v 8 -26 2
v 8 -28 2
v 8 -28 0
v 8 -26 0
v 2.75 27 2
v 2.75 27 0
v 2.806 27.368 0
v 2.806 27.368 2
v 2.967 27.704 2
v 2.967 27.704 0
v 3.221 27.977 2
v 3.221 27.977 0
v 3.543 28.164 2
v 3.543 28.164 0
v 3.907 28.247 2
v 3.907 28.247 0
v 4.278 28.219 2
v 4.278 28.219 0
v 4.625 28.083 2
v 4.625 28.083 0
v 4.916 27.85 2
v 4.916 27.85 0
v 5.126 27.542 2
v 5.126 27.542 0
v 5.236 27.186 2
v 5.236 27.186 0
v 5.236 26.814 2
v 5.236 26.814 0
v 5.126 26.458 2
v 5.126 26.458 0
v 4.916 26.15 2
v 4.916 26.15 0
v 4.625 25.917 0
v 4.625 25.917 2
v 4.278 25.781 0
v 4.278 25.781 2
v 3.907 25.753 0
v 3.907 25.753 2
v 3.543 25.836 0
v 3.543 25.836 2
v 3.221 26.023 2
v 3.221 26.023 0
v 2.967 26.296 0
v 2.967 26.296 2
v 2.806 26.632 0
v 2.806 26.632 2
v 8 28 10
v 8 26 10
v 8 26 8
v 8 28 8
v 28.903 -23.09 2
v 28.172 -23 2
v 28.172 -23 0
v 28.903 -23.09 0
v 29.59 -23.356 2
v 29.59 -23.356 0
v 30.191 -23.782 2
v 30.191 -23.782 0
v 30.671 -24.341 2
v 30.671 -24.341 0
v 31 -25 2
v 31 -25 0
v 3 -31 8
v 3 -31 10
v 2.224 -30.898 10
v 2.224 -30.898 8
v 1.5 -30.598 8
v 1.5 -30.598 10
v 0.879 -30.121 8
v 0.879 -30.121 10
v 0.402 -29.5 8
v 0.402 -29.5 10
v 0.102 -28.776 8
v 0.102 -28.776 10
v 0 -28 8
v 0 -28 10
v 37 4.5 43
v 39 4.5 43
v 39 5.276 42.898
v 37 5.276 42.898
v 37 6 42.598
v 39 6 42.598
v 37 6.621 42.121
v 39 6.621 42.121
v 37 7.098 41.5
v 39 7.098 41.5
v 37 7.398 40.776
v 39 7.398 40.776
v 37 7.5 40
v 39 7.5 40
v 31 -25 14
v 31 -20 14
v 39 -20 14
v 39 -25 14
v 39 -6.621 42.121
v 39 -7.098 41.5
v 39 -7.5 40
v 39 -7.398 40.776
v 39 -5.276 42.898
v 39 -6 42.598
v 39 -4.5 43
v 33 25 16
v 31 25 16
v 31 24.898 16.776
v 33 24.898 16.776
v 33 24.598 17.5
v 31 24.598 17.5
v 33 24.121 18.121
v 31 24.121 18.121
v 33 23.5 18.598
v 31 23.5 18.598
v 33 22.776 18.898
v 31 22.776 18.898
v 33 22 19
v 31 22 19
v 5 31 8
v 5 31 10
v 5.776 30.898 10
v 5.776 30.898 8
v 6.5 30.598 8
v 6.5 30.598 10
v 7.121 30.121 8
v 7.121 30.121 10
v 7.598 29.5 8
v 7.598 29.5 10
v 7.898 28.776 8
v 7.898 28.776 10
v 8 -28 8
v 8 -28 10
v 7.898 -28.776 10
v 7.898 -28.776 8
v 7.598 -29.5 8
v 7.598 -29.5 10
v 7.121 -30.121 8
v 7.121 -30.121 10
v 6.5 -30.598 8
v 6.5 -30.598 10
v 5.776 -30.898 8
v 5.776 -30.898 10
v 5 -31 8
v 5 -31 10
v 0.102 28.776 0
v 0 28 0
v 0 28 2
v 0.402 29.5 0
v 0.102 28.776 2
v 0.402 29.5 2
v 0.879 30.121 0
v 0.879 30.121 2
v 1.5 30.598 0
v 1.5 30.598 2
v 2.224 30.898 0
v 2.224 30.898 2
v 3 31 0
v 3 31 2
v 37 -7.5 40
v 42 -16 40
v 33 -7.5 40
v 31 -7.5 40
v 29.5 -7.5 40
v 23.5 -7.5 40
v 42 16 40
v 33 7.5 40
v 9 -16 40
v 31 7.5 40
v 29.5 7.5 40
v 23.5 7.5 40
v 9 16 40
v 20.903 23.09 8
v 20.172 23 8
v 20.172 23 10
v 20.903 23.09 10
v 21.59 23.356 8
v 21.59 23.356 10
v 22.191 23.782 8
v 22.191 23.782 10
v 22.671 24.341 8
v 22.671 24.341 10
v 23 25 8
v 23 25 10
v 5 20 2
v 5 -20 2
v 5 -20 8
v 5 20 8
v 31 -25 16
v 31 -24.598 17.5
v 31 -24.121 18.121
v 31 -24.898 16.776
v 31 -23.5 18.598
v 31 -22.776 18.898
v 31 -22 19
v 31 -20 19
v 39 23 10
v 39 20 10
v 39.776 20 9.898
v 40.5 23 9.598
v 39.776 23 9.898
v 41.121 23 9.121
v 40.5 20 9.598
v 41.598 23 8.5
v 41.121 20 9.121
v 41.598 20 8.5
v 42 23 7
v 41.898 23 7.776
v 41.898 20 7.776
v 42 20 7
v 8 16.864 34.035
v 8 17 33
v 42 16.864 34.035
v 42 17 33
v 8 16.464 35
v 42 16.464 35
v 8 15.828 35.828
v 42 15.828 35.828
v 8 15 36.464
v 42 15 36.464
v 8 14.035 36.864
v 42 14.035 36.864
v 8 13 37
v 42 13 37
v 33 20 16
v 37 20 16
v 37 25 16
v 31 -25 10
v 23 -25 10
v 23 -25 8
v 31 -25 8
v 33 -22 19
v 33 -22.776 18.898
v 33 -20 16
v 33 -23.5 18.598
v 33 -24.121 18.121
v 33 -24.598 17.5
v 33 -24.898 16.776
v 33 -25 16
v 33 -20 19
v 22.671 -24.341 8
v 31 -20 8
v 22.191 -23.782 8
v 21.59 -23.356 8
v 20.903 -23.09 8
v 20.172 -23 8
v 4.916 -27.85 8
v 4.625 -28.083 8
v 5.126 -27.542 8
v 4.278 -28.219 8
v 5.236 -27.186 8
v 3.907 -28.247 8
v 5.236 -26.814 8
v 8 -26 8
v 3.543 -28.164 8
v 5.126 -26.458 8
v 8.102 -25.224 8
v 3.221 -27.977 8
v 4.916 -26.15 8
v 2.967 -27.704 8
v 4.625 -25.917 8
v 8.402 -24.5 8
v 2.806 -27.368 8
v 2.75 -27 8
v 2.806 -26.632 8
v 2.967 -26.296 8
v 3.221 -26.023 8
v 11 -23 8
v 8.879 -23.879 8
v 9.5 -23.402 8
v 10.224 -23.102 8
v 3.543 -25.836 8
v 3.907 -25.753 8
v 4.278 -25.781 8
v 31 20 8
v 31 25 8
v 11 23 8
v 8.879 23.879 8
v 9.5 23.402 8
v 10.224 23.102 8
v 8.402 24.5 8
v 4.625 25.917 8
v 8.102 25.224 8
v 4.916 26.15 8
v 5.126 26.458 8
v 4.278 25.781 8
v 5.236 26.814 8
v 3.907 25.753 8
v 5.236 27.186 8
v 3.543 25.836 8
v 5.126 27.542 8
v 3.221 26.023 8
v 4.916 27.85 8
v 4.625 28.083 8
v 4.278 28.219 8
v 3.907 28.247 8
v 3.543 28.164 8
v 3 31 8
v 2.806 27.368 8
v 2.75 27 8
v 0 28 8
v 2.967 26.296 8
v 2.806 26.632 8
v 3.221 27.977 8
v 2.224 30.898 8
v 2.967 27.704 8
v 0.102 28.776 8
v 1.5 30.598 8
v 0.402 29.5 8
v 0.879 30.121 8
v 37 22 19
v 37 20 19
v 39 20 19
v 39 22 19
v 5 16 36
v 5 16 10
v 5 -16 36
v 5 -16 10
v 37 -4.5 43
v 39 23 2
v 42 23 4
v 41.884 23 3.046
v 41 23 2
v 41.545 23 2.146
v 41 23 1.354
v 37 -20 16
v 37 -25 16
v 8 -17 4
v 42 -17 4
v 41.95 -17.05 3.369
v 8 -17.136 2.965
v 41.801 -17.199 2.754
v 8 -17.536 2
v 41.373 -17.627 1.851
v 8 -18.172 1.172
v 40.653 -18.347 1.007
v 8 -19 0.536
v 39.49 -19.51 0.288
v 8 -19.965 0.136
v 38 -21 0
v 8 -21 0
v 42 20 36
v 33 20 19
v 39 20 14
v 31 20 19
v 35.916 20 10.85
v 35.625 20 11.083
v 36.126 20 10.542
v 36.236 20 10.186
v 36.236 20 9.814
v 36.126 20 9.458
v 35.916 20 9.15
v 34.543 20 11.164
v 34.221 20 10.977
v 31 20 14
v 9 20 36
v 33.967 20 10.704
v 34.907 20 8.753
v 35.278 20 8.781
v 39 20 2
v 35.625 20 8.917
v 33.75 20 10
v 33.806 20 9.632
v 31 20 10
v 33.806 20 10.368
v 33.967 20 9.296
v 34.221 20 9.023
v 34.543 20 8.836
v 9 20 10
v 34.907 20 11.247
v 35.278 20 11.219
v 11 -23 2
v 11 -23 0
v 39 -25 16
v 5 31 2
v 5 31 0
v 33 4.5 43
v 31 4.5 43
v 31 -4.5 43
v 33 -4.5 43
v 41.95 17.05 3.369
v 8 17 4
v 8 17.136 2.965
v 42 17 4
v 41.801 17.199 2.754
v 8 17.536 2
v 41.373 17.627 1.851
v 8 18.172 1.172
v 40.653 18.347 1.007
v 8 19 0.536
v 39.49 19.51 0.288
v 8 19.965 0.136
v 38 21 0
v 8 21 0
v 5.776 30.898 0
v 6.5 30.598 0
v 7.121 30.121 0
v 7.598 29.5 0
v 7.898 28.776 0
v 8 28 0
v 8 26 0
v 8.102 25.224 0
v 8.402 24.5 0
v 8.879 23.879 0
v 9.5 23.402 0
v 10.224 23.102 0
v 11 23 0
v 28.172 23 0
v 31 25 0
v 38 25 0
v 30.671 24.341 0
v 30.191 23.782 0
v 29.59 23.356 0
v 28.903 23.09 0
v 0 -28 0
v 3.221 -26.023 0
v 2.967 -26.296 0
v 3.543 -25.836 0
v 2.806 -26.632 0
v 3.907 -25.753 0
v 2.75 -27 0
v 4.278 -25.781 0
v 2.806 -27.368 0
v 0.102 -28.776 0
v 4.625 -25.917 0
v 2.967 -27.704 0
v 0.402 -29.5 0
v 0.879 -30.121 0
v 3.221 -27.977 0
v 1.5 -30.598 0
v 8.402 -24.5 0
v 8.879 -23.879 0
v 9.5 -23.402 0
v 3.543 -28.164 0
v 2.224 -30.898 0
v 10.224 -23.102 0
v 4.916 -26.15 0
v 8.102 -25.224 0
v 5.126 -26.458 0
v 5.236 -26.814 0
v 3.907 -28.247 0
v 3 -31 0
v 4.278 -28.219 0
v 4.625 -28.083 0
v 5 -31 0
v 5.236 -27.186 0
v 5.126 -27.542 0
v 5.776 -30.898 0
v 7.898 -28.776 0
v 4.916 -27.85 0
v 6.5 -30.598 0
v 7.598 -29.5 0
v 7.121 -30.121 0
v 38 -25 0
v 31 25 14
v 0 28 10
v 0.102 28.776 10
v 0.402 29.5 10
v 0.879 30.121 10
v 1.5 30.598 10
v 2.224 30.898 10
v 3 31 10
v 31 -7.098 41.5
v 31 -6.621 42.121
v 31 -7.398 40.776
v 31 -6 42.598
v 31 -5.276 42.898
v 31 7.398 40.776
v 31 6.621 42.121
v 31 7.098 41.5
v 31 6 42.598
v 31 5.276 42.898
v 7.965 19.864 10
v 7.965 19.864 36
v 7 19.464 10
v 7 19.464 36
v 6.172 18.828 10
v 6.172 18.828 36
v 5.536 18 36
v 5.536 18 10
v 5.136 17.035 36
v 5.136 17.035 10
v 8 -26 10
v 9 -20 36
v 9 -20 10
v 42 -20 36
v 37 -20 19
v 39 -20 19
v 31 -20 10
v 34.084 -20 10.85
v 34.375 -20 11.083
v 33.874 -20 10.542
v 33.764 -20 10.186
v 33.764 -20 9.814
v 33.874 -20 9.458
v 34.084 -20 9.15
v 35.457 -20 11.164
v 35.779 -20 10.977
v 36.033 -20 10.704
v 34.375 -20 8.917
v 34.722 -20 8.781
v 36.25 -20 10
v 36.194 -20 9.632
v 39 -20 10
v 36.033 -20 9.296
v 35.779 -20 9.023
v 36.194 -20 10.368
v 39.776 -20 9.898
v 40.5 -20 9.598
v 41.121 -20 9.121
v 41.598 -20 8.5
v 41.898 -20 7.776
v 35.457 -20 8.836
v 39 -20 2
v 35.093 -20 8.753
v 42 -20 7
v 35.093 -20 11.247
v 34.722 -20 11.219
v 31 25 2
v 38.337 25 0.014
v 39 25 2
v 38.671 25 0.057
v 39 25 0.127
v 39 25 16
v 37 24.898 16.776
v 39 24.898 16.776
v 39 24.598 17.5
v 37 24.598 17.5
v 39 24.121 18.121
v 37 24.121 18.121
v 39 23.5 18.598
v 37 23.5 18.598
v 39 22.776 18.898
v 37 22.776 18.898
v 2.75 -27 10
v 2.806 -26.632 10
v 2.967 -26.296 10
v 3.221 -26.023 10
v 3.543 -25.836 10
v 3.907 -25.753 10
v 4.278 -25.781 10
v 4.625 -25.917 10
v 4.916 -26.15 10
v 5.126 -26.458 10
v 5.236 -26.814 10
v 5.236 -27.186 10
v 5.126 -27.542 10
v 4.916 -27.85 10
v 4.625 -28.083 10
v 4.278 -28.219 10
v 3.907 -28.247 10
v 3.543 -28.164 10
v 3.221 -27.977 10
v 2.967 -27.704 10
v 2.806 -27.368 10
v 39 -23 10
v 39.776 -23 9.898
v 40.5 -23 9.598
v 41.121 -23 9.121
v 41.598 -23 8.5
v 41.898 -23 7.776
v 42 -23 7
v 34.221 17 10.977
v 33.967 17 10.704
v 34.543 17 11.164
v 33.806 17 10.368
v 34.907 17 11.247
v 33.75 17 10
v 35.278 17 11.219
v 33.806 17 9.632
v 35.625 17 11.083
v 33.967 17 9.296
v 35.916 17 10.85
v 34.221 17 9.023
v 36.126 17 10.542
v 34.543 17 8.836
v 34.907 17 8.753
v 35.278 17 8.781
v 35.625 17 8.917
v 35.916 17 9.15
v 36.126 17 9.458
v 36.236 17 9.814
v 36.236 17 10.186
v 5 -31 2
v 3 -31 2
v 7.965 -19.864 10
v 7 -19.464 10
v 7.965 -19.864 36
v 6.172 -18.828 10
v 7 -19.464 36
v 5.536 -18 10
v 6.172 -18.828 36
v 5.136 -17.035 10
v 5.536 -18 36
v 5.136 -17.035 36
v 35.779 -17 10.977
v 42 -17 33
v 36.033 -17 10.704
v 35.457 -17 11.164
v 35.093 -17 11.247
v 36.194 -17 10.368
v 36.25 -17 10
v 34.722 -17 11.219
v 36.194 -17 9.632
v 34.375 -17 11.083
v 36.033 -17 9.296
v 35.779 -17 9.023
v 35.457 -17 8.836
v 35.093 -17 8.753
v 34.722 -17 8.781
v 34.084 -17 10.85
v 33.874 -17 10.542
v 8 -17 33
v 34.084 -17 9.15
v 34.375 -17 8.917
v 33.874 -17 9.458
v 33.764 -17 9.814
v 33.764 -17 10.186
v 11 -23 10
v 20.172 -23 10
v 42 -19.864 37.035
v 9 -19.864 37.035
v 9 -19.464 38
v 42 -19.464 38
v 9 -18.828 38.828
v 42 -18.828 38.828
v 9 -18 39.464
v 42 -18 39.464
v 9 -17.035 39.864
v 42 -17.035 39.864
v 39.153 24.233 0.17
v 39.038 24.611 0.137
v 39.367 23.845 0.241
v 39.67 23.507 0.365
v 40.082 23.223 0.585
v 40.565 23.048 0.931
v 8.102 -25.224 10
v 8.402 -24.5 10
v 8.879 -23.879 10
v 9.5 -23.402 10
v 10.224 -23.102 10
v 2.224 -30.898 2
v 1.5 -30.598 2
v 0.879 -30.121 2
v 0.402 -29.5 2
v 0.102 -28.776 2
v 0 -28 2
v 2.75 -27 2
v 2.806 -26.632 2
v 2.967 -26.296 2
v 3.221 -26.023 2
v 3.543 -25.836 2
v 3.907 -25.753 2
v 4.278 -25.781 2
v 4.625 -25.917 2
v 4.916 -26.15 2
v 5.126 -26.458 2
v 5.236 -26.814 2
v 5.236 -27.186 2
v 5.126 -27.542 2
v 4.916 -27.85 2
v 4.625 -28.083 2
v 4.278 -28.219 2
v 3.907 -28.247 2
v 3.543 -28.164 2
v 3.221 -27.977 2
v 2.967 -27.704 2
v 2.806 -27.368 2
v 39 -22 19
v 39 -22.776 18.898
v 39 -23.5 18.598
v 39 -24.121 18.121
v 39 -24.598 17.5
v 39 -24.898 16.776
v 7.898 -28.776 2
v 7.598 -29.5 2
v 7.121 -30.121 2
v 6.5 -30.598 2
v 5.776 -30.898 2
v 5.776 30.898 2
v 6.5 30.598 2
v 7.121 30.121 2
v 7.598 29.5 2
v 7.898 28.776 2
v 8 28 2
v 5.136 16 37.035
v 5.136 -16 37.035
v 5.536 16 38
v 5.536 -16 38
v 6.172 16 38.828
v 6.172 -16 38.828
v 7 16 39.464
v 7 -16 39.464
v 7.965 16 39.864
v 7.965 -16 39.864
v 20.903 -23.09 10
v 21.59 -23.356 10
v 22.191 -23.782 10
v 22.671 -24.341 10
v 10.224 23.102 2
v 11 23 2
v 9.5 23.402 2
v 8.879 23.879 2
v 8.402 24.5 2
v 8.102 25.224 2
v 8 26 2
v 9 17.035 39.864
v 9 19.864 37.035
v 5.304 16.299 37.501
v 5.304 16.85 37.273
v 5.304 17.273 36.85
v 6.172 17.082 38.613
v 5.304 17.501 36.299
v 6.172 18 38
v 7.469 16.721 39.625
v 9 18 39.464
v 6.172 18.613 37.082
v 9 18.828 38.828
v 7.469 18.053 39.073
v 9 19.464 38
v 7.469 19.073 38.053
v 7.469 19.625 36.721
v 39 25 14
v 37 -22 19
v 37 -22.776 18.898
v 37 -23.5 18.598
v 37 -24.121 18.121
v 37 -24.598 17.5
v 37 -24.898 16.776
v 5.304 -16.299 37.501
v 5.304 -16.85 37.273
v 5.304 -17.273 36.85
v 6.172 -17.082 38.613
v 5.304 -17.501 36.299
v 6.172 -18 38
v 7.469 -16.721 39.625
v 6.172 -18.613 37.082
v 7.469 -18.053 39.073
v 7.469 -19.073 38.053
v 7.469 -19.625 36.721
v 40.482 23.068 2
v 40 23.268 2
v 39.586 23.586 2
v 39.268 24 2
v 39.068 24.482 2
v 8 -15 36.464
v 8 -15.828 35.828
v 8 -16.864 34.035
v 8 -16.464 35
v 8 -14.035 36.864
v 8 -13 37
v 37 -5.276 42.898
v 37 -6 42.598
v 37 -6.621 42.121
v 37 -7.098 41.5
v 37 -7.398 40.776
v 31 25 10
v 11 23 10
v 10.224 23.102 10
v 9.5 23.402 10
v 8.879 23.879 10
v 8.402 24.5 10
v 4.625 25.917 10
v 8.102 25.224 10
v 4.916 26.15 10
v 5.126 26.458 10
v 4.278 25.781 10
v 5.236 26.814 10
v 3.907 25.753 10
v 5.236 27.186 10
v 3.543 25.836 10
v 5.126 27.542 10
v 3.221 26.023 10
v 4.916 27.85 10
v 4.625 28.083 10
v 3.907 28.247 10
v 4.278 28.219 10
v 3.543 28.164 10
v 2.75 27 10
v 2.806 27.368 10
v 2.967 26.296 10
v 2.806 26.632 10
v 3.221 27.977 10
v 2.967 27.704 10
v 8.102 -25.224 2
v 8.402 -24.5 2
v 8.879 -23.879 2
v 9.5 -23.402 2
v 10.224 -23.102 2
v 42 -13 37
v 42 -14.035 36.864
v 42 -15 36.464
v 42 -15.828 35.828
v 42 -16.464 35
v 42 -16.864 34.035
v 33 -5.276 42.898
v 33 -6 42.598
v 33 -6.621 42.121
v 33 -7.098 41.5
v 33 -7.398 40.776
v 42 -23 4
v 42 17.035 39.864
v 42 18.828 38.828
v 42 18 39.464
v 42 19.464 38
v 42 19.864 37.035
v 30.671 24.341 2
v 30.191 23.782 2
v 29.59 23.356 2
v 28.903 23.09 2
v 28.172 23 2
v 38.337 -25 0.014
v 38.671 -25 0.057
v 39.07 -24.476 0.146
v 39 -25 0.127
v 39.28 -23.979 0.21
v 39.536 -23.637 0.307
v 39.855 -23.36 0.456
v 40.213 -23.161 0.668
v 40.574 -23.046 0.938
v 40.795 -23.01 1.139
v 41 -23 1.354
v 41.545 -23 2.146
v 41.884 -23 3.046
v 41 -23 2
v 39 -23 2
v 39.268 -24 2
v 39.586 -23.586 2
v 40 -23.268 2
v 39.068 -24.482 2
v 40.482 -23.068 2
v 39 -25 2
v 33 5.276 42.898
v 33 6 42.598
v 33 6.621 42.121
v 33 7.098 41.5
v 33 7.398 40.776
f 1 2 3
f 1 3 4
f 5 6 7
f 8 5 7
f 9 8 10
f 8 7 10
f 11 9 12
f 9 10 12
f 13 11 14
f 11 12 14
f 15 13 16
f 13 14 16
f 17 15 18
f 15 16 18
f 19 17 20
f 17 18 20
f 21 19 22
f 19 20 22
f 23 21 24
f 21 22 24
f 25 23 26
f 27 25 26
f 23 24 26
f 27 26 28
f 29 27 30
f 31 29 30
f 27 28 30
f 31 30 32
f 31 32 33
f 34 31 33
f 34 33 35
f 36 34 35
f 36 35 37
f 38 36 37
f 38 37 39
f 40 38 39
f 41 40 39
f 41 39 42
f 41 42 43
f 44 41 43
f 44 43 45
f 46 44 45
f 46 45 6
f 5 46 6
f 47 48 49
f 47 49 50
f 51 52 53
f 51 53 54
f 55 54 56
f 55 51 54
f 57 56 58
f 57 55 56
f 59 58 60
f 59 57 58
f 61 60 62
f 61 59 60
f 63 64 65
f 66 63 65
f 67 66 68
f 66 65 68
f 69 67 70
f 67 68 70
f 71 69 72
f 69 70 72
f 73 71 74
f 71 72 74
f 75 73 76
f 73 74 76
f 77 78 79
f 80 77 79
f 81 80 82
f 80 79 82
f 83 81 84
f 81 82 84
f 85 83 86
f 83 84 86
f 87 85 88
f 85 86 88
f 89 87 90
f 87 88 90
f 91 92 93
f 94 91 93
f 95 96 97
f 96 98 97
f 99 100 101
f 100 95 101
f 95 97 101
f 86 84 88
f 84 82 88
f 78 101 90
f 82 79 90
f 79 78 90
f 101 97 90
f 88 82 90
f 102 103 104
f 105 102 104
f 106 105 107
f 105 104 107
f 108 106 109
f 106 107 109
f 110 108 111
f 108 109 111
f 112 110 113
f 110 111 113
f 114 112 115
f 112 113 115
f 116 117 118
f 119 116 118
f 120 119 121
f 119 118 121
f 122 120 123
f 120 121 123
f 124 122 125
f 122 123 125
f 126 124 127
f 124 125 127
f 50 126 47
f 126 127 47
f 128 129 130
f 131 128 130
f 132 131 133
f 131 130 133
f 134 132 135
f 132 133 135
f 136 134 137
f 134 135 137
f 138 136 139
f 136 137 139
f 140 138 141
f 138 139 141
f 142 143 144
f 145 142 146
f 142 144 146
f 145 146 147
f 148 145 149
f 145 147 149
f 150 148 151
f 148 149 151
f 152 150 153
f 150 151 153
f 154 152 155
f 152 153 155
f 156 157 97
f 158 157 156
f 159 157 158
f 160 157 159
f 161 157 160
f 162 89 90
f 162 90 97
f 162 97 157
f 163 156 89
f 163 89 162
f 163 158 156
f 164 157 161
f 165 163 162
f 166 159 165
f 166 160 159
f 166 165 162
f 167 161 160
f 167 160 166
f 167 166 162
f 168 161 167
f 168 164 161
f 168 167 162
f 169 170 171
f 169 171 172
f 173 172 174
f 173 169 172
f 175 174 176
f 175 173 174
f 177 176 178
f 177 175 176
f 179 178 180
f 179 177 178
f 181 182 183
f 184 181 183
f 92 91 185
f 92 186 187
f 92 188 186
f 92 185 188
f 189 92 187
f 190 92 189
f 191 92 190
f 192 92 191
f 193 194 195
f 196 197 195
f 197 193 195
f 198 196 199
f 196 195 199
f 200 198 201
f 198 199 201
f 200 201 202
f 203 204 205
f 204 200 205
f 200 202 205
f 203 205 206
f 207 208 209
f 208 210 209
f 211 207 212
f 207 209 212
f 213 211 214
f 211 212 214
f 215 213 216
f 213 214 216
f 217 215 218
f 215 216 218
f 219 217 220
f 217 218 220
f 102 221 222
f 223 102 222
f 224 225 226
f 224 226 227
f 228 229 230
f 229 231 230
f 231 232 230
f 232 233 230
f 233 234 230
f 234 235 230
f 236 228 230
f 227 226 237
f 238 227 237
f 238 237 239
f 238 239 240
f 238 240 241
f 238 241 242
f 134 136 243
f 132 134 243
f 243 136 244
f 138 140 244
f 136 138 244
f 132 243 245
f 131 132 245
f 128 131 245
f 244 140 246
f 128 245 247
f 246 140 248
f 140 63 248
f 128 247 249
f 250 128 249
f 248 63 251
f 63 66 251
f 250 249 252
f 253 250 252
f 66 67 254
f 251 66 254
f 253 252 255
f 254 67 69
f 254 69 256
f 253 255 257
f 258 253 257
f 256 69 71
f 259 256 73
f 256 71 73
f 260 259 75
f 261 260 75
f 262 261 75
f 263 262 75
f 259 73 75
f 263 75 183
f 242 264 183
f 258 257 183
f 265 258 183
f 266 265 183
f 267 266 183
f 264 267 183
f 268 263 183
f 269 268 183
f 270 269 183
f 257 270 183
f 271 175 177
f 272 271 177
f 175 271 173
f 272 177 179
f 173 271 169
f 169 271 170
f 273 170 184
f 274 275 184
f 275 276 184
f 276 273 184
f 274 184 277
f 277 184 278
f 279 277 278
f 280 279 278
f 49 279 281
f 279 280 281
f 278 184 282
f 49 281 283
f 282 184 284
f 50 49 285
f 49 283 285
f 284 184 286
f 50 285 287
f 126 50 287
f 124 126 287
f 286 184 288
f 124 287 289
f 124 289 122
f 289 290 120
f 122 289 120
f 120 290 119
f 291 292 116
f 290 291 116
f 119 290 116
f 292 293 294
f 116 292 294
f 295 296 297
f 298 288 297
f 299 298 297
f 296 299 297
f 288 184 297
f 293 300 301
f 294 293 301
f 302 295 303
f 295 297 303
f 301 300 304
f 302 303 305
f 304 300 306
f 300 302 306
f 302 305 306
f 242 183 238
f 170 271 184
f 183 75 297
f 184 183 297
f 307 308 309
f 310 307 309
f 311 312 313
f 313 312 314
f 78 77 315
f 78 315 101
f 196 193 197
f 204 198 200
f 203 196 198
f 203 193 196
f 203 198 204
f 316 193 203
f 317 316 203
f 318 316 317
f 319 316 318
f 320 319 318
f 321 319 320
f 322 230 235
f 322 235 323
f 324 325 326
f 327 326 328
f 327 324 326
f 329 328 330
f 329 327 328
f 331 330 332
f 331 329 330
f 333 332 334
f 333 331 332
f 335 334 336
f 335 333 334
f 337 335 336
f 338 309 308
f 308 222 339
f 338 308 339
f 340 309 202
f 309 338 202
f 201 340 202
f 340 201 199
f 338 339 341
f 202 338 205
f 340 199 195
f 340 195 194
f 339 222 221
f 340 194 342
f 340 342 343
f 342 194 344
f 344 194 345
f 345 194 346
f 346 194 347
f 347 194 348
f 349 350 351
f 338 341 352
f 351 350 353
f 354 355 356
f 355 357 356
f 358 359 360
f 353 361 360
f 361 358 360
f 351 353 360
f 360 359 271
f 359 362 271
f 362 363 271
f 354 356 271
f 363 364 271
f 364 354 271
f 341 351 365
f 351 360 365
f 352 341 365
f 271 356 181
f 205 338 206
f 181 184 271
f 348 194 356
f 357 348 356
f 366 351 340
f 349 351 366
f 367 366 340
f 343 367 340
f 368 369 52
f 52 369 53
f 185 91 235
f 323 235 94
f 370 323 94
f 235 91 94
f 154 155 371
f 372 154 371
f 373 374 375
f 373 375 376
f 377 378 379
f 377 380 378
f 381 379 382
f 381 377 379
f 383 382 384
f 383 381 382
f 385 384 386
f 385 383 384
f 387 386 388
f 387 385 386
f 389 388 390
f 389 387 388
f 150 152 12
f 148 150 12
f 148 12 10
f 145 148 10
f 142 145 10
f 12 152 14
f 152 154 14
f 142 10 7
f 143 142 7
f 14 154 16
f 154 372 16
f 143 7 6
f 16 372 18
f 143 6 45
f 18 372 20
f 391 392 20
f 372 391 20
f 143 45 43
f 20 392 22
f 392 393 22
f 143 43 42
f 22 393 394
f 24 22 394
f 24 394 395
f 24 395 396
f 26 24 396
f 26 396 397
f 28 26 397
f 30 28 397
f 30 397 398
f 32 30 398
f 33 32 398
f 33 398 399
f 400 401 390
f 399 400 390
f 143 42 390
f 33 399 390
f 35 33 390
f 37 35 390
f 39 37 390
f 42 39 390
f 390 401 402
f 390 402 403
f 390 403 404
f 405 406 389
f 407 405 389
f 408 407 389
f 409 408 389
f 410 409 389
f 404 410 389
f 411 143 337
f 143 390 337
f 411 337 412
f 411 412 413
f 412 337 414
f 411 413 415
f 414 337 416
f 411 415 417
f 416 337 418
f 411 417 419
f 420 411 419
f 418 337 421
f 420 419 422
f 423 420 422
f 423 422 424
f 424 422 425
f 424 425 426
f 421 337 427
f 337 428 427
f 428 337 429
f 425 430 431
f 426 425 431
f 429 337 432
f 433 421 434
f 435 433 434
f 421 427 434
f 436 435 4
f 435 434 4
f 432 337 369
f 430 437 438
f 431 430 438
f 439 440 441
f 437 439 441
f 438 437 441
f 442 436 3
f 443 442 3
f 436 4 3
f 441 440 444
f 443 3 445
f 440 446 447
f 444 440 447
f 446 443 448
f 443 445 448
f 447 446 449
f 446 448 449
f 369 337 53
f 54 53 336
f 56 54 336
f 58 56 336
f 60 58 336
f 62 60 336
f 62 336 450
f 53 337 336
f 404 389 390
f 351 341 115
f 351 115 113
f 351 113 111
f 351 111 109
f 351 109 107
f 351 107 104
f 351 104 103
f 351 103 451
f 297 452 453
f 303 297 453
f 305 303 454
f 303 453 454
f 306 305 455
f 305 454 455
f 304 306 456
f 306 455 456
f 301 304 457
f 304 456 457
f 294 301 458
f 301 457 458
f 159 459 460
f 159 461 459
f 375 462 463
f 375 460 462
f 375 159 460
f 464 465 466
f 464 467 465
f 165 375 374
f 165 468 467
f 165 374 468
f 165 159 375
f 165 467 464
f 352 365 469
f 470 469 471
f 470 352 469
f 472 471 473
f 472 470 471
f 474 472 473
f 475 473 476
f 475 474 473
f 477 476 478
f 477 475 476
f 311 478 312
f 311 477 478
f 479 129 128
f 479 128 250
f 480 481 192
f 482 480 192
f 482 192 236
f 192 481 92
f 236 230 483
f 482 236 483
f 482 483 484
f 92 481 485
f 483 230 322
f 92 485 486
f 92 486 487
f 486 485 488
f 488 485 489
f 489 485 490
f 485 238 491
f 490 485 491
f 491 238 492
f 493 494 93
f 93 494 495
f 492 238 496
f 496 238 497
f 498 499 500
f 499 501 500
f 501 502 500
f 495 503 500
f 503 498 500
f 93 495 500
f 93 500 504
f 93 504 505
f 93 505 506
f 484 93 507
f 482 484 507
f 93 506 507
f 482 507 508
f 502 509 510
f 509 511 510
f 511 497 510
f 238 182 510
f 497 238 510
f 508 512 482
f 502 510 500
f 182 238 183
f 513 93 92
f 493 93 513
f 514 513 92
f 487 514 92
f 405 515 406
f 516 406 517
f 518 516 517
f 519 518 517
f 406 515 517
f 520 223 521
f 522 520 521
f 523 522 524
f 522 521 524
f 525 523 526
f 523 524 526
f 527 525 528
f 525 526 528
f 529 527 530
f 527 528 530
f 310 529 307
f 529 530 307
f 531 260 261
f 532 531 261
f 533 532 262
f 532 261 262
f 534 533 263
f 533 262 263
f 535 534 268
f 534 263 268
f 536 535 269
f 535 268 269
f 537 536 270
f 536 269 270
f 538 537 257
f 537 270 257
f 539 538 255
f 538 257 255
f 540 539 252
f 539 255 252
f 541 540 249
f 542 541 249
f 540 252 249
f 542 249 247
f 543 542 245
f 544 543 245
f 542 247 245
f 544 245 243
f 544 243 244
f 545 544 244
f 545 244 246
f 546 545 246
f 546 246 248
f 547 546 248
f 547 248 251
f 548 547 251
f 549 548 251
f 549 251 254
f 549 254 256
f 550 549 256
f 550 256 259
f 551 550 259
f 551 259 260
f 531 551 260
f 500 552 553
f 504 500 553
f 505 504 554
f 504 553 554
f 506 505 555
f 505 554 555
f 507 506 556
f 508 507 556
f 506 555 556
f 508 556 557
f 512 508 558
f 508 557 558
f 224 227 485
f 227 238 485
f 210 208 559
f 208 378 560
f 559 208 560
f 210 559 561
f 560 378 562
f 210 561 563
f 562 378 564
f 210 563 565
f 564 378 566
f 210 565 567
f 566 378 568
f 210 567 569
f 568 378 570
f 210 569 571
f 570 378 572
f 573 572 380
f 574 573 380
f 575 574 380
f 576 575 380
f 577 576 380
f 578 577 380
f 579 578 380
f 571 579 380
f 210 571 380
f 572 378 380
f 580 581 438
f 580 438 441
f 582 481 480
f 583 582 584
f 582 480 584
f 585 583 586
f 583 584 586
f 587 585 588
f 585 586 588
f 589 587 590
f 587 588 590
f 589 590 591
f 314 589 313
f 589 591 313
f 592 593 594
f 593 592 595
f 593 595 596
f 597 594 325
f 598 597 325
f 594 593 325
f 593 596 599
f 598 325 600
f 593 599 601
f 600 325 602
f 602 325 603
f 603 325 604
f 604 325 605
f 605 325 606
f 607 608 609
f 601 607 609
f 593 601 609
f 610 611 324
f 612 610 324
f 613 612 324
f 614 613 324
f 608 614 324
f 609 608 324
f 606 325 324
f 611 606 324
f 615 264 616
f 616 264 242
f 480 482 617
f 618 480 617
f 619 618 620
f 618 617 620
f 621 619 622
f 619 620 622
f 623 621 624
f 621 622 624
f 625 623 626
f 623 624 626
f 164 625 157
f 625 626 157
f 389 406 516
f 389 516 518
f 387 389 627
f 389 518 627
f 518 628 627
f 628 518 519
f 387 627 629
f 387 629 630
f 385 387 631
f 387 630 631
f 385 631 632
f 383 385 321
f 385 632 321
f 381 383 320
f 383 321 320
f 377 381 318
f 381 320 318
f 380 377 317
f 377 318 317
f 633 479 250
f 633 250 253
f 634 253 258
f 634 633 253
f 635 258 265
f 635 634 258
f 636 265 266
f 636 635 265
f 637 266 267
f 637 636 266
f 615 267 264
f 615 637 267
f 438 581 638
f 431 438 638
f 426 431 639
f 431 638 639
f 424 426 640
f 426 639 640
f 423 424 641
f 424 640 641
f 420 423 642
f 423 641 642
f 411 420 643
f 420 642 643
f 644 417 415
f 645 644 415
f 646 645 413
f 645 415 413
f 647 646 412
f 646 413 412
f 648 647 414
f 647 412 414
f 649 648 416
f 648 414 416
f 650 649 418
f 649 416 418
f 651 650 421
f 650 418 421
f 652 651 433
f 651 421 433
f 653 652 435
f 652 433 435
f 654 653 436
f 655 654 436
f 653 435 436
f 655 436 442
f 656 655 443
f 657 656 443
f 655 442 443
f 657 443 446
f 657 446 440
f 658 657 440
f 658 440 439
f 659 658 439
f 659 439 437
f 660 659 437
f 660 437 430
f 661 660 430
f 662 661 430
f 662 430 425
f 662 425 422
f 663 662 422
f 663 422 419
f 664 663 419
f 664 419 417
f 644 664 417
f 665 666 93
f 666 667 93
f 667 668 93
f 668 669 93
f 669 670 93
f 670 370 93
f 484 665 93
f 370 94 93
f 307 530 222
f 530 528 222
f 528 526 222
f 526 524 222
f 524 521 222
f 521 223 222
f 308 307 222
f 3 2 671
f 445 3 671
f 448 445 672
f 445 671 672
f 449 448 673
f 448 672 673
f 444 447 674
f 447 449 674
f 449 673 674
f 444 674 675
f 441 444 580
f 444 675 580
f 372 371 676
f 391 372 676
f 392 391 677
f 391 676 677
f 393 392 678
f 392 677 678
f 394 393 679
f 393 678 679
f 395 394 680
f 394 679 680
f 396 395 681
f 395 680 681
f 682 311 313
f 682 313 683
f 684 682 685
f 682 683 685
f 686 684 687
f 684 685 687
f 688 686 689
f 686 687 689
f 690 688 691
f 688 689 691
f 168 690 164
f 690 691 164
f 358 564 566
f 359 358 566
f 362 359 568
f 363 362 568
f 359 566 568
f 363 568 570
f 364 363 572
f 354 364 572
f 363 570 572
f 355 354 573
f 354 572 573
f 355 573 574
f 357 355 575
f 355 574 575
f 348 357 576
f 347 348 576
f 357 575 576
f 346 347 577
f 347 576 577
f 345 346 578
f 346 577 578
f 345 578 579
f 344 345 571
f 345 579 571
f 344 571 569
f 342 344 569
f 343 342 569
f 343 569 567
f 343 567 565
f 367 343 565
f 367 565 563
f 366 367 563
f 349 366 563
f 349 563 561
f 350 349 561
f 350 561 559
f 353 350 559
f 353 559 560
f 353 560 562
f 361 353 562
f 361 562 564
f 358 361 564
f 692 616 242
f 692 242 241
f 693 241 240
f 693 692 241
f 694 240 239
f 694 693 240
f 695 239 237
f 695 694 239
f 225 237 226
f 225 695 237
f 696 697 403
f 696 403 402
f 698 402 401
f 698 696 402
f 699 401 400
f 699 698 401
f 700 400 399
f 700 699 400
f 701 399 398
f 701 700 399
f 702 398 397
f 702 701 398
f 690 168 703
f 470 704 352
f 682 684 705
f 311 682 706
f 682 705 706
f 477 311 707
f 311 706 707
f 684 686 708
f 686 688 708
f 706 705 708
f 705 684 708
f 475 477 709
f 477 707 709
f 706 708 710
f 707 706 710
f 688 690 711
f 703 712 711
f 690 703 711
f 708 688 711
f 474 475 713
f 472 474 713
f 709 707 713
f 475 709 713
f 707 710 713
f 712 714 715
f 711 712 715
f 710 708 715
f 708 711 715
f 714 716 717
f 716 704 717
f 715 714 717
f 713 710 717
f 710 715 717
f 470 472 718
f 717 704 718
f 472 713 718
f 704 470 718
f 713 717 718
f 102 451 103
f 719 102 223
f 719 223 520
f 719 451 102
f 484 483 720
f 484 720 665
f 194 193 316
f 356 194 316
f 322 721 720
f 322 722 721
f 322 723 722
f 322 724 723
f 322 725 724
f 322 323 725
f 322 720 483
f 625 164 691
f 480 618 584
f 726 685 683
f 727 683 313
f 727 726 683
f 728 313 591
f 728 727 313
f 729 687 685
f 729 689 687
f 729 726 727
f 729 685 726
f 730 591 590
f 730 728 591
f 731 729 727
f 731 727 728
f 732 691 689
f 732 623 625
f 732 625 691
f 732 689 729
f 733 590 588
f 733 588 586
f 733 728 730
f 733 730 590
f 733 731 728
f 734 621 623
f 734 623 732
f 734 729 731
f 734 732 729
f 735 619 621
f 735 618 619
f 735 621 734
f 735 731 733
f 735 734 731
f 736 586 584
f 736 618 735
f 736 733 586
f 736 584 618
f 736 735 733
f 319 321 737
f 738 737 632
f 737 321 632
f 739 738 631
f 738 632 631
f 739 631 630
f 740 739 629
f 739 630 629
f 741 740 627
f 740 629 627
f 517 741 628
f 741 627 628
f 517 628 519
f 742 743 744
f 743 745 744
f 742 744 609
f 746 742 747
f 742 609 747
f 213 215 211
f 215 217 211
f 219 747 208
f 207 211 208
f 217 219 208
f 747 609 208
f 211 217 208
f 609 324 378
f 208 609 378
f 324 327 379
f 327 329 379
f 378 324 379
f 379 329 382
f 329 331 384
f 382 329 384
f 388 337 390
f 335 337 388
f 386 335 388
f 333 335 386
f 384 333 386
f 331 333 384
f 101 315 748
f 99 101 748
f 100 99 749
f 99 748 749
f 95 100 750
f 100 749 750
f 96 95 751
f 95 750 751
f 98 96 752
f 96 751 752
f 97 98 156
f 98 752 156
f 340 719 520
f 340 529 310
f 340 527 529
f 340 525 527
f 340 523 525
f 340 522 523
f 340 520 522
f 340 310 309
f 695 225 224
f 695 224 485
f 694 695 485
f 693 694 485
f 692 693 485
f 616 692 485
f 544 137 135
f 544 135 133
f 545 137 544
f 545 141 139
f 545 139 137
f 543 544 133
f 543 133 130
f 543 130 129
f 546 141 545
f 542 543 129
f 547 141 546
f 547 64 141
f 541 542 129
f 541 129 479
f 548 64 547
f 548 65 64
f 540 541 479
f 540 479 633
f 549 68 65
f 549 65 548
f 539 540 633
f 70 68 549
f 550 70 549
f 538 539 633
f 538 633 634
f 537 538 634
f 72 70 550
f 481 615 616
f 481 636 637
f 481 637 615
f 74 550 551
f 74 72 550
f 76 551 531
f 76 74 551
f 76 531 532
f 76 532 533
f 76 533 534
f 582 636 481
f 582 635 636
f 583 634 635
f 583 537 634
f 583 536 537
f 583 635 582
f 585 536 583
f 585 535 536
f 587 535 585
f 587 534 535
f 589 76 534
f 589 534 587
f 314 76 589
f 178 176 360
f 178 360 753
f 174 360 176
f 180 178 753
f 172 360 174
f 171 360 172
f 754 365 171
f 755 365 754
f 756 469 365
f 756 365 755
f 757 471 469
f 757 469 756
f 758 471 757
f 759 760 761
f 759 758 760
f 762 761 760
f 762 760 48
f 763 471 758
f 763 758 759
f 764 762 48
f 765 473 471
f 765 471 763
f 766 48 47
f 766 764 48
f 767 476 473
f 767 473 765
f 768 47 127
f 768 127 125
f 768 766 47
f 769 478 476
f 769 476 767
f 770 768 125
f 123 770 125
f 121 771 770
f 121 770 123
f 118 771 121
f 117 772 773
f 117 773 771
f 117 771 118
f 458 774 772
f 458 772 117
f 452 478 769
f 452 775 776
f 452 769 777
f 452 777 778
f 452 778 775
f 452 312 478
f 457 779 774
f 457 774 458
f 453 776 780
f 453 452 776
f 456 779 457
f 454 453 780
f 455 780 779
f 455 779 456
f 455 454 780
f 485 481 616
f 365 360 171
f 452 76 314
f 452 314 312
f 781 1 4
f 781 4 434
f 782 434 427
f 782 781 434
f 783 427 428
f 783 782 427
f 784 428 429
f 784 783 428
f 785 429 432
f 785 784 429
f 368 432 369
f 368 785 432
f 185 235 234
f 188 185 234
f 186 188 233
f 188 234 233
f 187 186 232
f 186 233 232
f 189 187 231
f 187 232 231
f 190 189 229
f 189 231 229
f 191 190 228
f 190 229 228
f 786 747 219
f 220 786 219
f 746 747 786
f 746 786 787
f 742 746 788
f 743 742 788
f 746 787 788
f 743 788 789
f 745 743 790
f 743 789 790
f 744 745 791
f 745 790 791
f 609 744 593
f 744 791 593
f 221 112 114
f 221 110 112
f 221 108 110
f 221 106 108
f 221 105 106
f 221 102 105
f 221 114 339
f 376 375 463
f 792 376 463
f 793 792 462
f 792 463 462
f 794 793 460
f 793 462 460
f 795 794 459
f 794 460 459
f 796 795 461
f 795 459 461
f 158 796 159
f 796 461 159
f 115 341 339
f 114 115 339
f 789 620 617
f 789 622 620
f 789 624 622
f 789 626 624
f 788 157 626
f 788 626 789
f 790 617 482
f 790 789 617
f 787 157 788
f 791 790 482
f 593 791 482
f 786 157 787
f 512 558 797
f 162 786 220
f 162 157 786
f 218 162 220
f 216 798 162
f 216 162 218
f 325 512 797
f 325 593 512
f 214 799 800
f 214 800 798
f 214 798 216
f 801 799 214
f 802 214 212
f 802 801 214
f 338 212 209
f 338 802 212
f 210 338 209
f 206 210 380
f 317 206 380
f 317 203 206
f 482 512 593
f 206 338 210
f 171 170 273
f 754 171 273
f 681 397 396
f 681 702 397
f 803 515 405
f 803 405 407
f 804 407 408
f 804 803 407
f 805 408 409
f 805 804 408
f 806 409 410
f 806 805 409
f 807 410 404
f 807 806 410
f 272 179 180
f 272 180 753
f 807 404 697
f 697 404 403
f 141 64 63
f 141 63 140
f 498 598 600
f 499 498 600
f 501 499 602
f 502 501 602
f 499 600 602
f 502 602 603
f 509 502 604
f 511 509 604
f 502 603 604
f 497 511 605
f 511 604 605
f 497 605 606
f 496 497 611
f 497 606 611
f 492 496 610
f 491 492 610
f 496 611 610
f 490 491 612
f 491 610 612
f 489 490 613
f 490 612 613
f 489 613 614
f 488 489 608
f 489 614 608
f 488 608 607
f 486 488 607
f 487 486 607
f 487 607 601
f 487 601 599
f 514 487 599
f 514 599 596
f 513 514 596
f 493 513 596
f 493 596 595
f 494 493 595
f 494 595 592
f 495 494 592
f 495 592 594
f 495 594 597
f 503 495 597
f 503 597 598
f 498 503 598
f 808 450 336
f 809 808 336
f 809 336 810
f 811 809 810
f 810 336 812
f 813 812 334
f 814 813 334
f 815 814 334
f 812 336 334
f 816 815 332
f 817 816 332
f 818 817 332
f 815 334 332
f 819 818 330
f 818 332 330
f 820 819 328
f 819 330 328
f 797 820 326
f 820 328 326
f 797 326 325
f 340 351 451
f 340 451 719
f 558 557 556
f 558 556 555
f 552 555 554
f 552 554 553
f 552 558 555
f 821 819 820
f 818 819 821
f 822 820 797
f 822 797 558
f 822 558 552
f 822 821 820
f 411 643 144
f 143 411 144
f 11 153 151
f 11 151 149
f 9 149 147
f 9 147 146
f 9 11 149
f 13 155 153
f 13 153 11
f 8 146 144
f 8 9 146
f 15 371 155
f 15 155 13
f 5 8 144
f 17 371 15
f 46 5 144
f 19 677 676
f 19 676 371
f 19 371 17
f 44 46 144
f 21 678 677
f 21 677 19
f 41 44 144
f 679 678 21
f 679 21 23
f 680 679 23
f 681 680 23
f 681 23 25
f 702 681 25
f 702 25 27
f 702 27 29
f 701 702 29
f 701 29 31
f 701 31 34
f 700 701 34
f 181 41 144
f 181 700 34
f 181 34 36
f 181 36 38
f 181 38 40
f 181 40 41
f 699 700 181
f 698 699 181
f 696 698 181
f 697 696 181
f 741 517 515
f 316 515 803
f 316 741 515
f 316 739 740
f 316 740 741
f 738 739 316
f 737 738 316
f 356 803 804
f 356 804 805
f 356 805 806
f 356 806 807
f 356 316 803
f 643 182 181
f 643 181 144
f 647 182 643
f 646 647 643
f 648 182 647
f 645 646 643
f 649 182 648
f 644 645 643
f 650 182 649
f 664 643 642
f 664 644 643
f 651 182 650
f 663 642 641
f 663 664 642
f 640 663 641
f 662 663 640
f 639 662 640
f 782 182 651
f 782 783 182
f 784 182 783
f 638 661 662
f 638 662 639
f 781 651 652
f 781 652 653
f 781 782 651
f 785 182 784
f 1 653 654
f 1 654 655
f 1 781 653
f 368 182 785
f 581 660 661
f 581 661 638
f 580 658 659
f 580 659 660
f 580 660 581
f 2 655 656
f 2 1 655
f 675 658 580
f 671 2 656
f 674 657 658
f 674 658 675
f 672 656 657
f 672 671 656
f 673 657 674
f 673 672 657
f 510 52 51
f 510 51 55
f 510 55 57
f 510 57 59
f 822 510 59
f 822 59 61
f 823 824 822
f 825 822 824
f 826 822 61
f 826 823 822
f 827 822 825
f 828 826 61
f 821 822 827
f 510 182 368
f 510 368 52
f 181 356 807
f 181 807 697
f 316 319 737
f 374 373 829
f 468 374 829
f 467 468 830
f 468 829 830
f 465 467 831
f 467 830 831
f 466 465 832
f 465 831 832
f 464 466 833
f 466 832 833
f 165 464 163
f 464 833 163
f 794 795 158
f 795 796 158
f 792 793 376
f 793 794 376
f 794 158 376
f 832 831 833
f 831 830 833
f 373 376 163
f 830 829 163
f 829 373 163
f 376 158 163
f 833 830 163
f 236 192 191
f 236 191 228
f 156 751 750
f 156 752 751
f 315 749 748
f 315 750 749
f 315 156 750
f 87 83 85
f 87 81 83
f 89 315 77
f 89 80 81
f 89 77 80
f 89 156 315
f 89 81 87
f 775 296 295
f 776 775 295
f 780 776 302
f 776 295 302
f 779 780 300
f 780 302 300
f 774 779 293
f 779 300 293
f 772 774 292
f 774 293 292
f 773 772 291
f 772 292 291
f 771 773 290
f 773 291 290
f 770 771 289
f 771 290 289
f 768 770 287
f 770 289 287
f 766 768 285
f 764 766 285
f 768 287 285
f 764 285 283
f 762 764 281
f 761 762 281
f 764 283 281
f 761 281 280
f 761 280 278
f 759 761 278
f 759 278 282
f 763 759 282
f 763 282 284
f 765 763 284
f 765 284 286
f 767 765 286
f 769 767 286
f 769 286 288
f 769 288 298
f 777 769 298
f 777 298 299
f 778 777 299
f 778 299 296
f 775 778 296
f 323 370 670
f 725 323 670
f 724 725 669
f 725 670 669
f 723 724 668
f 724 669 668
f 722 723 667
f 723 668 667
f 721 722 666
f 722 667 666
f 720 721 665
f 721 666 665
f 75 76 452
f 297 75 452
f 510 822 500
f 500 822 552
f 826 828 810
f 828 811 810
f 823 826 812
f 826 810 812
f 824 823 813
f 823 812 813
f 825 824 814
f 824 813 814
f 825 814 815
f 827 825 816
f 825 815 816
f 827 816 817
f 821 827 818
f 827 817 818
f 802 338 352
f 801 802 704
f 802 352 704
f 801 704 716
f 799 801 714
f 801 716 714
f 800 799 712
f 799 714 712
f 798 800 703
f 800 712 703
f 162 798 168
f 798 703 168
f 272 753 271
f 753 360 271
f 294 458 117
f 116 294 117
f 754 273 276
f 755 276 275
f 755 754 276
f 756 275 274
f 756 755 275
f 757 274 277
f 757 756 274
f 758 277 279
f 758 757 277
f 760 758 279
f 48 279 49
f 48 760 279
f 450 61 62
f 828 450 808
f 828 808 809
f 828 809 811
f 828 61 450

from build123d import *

# Parameters (mm, degrees)
ESTRUSIONE_ESTRUSIONE1_DEPTH  = 10
SCHIZZO6_W                    = 8
SCHIZZO6_H                    = 8
SCHIZZO6_H_2                  = 2
ESTRUSIONE_ESTRUSIONE4_DEPTH  = 10
TAGLIO_ESTRUSIONE1_DEPTH      = 54.150729064
SCHIZZO4_W                    = 3
SCHIZZO4_H                    = 6
ESTRUSIONE_ESTRUSIONE2_DEPTH  = 3
SCHIZZO5_W                    = 3
SCHIZZO5_H                    = 6
ESTRUSIONE_ESTRUSIONE3_DEPTH  = 3
SCHIZZO3_W                    = 5
SCHIZZO3_H                    = 6
TAGLIO_ESTRUSIONE2_DEPTH      = 67.820655489
FORO_FILETTATO_M3X0_5_1_D     = 2.5
ESTRUSIONE_ESTRUSIONE5_DEPTH  = 30
SCHIZZO10_W                   = 3
SCHIZZO10_H                   = 34
ESTRUSIONE_ESTRUSIONE6_DEPTH  = 34
SCHIZZO18_W                   = 8
SCHIZZO18_H                   = 8
TAGLIO_ESTRUSIONE3_DEPTH      = 5
SCHIZZO24_W                   = 8
SCHIZZO24_H                   = 2
ESTRUSIONE_ESTRUSIONE9_DEPTH  = 5
SCHIZZO23_W                   = 8
SCHIZZO23_H                   = 8
TAGLIO_ESTRUSIONE4_DEPTH      = 5
SCHIZZO25_W                   = 8
SCHIZZO25_H                   = 2
ESTRUSIONE_ESTRUSIONE10_DEPTH = 5
FORO_FILETTATO_M3X0_5_4_D     = 2.5
FORO_FILETTATO_M3X0_5_4_DEPTH = 7.5
FORO_FILETTATO_M3X0_5_4_TIP   = 0.751075774
FORO_FILETTATO_M3X0_5_5_D     = 2.5
FORO_FILETTATO_M3X0_5_5_DEPTH = 7.5
FORO_FILETTATO_M3X0_5_5_TIP   = 0.751075774
SCHIZZO11_W                   = 2
SCHIZZO11_H                   = 15
ESTRUSIONE_ESTRUSIONE7_DEPTH  = 3
SCHIZZO12_W                   = 2
SCHIZZO12_H                   = 5
ESTRUSIONE_ESTRUSIONE8_DEPTH  = 3
SCHIZZO28_W                   = 8
SCHIZZO28_H                   = 2
ESTRUSIONE_ESTRUSIONE11_DEPTH = 2
SCHIZZO29_W                   = 8
SCHIZZO29_H                   = 2
ESTRUSIONE_ESTRUSIONE12_DEPTH = 2
RACCORDO1_R                   = 4
RACCORDO2_R                   = 3
RACCORDO30_R                  = 2


# Some blends are built 0.0001 mm under size
with BuildPart() as part:
    # Schizzo1 → Estrusione-Estrusione1 (new body)
    with BuildSketch(Plane.XY):
        Polygon((0, -23), (42, -23), (42, -17), (8, -17), (8, 17), (42, 17), (42, 23), (0, 23), align=None)
    extrude(amount=ESTRUSIONE_ESTRUSIONE1_DEPTH)

    # Schizzo6 → Estrusione-Estrusione4 (add)
    with BuildSketch(Plane.XY.offset(10)):
        with Locations((4, -27)):
            Rectangle(SCHIZZO6_W, SCHIZZO6_H)
        with Locations((4, 27)):
            Rectangle(SCHIZZO6_W, SCHIZZO6_H)
        with Locations((35, -24)):
            Rectangle(SCHIZZO6_W, SCHIZZO6_H_2)
        with Locations((35, 24)):
            Rectangle(SCHIZZO6_W, SCHIZZO6_H_2)
    extrude(amount=-ESTRUSIONE_ESTRUSIONE4_DEPTH)

    # Schizzo2 → Taglio-Estrusione1 (cut, through all)
    with BuildSketch(Plane(origin=(42, 0, 0), x_dir=(0, 0, -1), z_dir=(1, 0, 0))):
        Polygon((-8, -23), (-8, -41.817102562), (-2, -41.817102562), (-2, -22.5), (-2, -20), (-8, -20), align=None)
    taglio_estrusione1 = extrude(amount=-TAGLIO_ESTRUSIONE1_DEPTH, mode=Mode.SUBTRACT)

    # Schizzo4 → Estrusione-Estrusione2 (add)
    with BuildSketch(Plane(origin=(0, -20, 0), x_dir=(-1, 0, 0), z_dir=(0, -1, 0))):
        with Locations((-40.5, -5)):
            Rectangle(SCHIZZO4_W, SCHIZZO4_H)
    extrude(amount=ESTRUSIONE_ESTRUSIONE2_DEPTH)

    # Specchia1: Taglio-Estrusione1 across plane
    add(taglio_estrusione1.mirror(Plane.ZX), mode=Mode.SUBTRACT)

    # Schizzo5 → Estrusione-Estrusione3 (add)
    with BuildSketch(Plane(origin=(0, 20, 0), x_dir=(1, 0, 0), z_dir=(0, 1, 0))):
        with Locations((40.5, -5)):
            Rectangle(SCHIZZO5_W, SCHIZZO5_H)
    extrude(amount=ESTRUSIONE_ESTRUSIONE3_DEPTH)

    # Schizzo3 → Taglio-Estrusione2 (cut, through all)
    with BuildSketch(Plane.XZ.offset(20)):
        with Locations((2.5, 5)):
            Rectangle(SCHIZZO3_W, SCHIZZO3_H)
    extrude(amount=-TAGLIO_ESTRUSIONE2_DEPTH, mode=Mode.SUBTRACT)

    # Foro filettato M3x0.5-1 (through all)
    with Locations(Plane.XY.offset(10)):
        with Locations((4, -27), (4, 27)):
            Hole(FORO_FILETTATO_M3X0_5_1_D / 2)

    # Schizzo9 → Estrusione-Estrusione5 (add)
    with BuildSketch(Plane.XY.offset(10)):
        Polygon((5, -20), (42, -20), (42, -17), (8, -17), (8, 17), (42, 17), (42, 20), (5, 20), align=None)
    extrude(amount=ESTRUSIONE_ESTRUSIONE5_DEPTH)

    # Schizzo10 → Estrusione-Estrusione6 (add)
    with BuildSketch(Plane(origin=(8, 0, 0), x_dir=(0, 0, -1), z_dir=(1, 0, 0))):
        with Locations((-38.5, 0)):
            Rectangle(SCHIZZO10_W, SCHIZZO10_H)
    extrude(amount=ESTRUSIONE_ESTRUSIONE6_DEPTH)

    # Schizzo18 → Taglio-Estrusione3 (cut)
    with BuildSketch(Plane.XZ.offset(25)):
        with Locations((35, 12)):
            Rectangle(SCHIZZO18_W, SCHIZZO18_H)
    extrude(amount=-TAGLIO_ESTRUSIONE3_DEPTH, mode=Mode.SUBTRACT)

    # Schizzo24 → Estrusione-Estrusione9 (add)
    with BuildSketch(Plane.XZ.offset(20)):
        with Locations((35, 15)):
            Rectangle(SCHIZZO24_W, SCHIZZO24_H)
    extrude(amount=ESTRUSIONE_ESTRUSIONE9_DEPTH)

    # Schizzo23 → Taglio-Estrusione4 (cut)
    with BuildSketch(Plane(origin=(0, 25, 0), x_dir=(1, 0, 0), z_dir=(0, 1, 0))):
        with Locations((35, -12)):
            Rectangle(SCHIZZO23_W, SCHIZZO23_H)
    extrude(amount=-TAGLIO_ESTRUSIONE4_DEPTH, mode=Mode.SUBTRACT)

    # Schizzo25 → Estrusione-Estrusione10 (add)
    with BuildSketch(Plane(origin=(0, 20, 0), x_dir=(1, 0, 0), z_dir=(0, 1, 0))):
        with Locations((35, -15)):
            Rectangle(SCHIZZO25_W, SCHIZZO25_H)
    extrude(amount=ESTRUSIONE_ESTRUSIONE10_DEPTH)

    # Foro filettato M3x0.5-4
    with Locations(Plane(origin=(0, -20, 0), x_dir=(-1, 0, 0), z_dir=(0, -1, 0))):
        with Locations((-35, -10)):
            Hole(FORO_FILETTATO_M3X0_5_4_D / 2, depth=FORO_FILETTATO_M3X0_5_4_DEPTH)
            with Locations((0, 0, -(FORO_FILETTATO_M3X0_5_4_DEPTH + FORO_FILETTATO_M3X0_5_4_TIP / 2))):  # 118° drill point
                Cone(0, FORO_FILETTATO_M3X0_5_4_D / 2, FORO_FILETTATO_M3X0_5_4_TIP, mode=Mode.SUBTRACT)

    # Foro filettato M3x0.5-5
    with Locations(Plane(origin=(0, 20, 0), x_dir=(1, 0, 0), z_dir=(0, 1, 0))):
        with Locations((35, -10)):
            Hole(FORO_FILETTATO_M3X0_5_5_D / 2, depth=FORO_FILETTATO_M3X0_5_5_DEPTH)
            with Locations((0, 0, -(FORO_FILETTATO_M3X0_5_5_DEPTH + FORO_FILETTATO_M3X0_5_5_TIP / 2))):  # 118° drill point
                Cone(0, FORO_FILETTATO_M3X0_5_5_D / 2, FORO_FILETTATO_M3X0_5_5_TIP, mode=Mode.SUBTRACT)

    # Schizzo11 → Estrusione-Estrusione7 (add)
    with BuildSketch(Plane.XY.offset(40)):
        with Locations((38, 0)):
            Rectangle(SCHIZZO11_W, SCHIZZO11_H)
        with Locations((32, 0)):
            Rectangle(SCHIZZO11_W, SCHIZZO11_H)
    extrude(amount=ESTRUSIONE_ESTRUSIONE7_DEPTH)

    # Schizzo12 → Estrusione-Estrusione8 (add)
    with BuildSketch(Plane.XY.offset(16)):
        with Locations((38, -22.5)):
            Rectangle(SCHIZZO12_W, SCHIZZO12_H)
        with Locations((32, -22.5)):
            Rectangle(SCHIZZO12_W, SCHIZZO12_H)
    estrusione_estrusione8 = extrude(amount=ESTRUSIONE_ESTRUSIONE8_DEPTH)

    # Schizzo28 → Estrusione-Estrusione11 (add)
    with BuildSketch(Plane.XZ.offset(23)):
        with Locations((27, 9)):
            Rectangle(SCHIZZO28_W, SCHIZZO28_H)
    extrude(amount=ESTRUSIONE_ESTRUSIONE11_DEPTH)

    # Schizzo29 → Estrusione-Estrusione12 (add)
    with BuildSketch(Plane(origin=(0, 23, 0), x_dir=(1, 0, 0), z_dir=(0, 1, 0))):
        with Locations((27, -9)):
            Rectangle(SCHIZZO29_W, SCHIZZO29_H)
    extrude(amount=ESTRUSIONE_ESTRUSIONE12_DEPTH)

    # Specchia2: Estrusione-Estrusione8 across plane
    add(estrusione_estrusione8.mirror(Plane.ZX))

    # Raccordo1
    raccordo1_edges = [part.edges().sort_by_distance(p)[0] for p in [
        (23.5, -20, 40),
        (23.5, 20, 40),
        (5, 0, 40),
        (5, 20, 25),
        (5, -20, 25),
        (42, 20, 0),
        (42, -20, 0),
        (25, -17, 37),
        (25, -17, 0),
        (25, 17, 37),
        (25, 17, 0),
    ]]
    fillet(raccordo1_edges, radius=RACCORDO1_R)

    # Raccordo2
    # the kernel refuses this fillet: 3 mm, written as the material it adds along each edge
    with BuildSketch(Plane(origin=(8, 23, 9.5), x_dir=(1, 0, 0), z_dir=(0, 0, -1))) as raccordo2_piece_1_section:
        with BuildLine():
            CenterArc((RACCORDO2_R, -RACCORDO2_R), RACCORDO2_R, 90, 90)
            Line((0, -RACCORDO2_R), (0, 0))
            Line((0, 0), (RACCORDO2_R, 0))
        make_face()
    raccordo2_piece_1 = extrude(amount=17, mode=Mode.PRIVATE)
    raccordo2_piece_1 = split(raccordo2_piece_1, bisect_by=Plane(origin=(8, 23, 8), z_dir=(0, 0, 1)), keep=Keep.TOP, mode=Mode.PRIVATE)
    add(raccordo2_piece_1)
    with BuildSketch(Plane(origin=(8, 23, 2), x_dir=(1, 0, 0), z_dir=(0, 0, -1)), Plane(origin=(8, -23, 2), x_dir=(0, -1, 0), z_dir=(0, 0, -1))) as raccordo2_piece_2:
        with BuildLine():
            CenterArc((RACCORDO2_R, -RACCORDO2_R), RACCORDO2_R, 90, 90)
            Line((0, -RACCORDO2_R), (0, 0))
            Line((0, 0), (RACCORDO2_R, 0))
        make_face()
    extrude(amount=2)
    with BuildSketch(Plane(origin=(8, 23, 10), x_dir=(0, 1, 0), z_dir=(0, 0, -1)), Plane(origin=(8, -23, 10), x_dir=(1, 0, 0), z_dir=(0, 0, -1))) as raccordo2_piece_3:
        with BuildLine():
            CenterArc((RACCORDO2_R, RACCORDO2_R), RACCORDO2_R, 180, 90)
            Line((0, RACCORDO2_R), (0, 0))
            Line((0, 0), (RACCORDO2_R, 0))
        make_face()
    extrude(amount=2)
    with BuildSketch(Plane(origin=(8, 23, 17.5), x_dir=(0, 1, 0), z_dir=(0, 0, -1))) as raccordo2_piece_4_section:
        with BuildLine():
            CenterArc((RACCORDO2_R, RACCORDO2_R), RACCORDO2_R, 180, 90)
            Line((0, RACCORDO2_R), (0, 0))
            Line((0, 0), (RACCORDO2_R, 0))
        make_face()
    raccordo2_piece_4 = extrude(amount=17, mode=Mode.PRIVATE)
    raccordo2_piece_4 = split(raccordo2_piece_4, bisect_by=Plane(origin=(8, 23, 2), z_dir=(0, 0, -1)), keep=Keep.TOP, mode=Mode.PRIVATE)
    add(raccordo2_piece_4)
    with BuildSketch(Plane(origin=(8, -23, 9.5), x_dir=(0, -1, 0), z_dir=(0, 0, -1))) as raccordo2_piece_5_section:
        with BuildLine():
            CenterArc((RACCORDO2_R, -RACCORDO2_R), RACCORDO2_R, 90, 90)
            Line((0, -RACCORDO2_R), (0, 0))
            Line((0, 0), (RACCORDO2_R, 0))
        make_face()
    raccordo2_piece_5 = extrude(amount=17, mode=Mode.PRIVATE)
    raccordo2_piece_5 = split(raccordo2_piece_5, bisect_by=Plane(origin=(8, -23, 8), z_dir=(0, 0, 1)), keep=Keep.TOP, mode=Mode.PRIVATE)
    add(raccordo2_piece_5)
    with BuildSketch(Plane(origin=(8, -23, 17.5), x_dir=(1, 0, 0), z_dir=(0, 0, -1))) as raccordo2_piece_6_section:
        with BuildLine():
            CenterArc((RACCORDO2_R, RACCORDO2_R), RACCORDO2_R, 180, 90)
            Line((0, RACCORDO2_R), (0, 0))
            Line((0, 0), (RACCORDO2_R, 0))
        make_face()
    raccordo2_piece_6 = extrude(amount=17, mode=Mode.PRIVATE)
    raccordo2_piece_6 = split(raccordo2_piece_6, bisect_by=Plane(origin=(8, -23, 2), z_dir=(0, 0, -1)), keep=Keep.TOP, mode=Mode.PRIVATE)
    add(raccordo2_piece_6)
    with BuildSketch(Plane(origin=(23, 23, 8), x_dir=(-1, 0, 0), z_dir=(0, 0, 1)), Plane(origin=(31, -23, 2), x_dir=(-1, 0, 0), z_dir=(0, 0, -1))) as raccordo2_piece_7:
        with BuildLine():
            CenterArc((2.828427125, -3), RACCORDO2_R, 90, 70.528779366)
            Line((0, -2), (0, 0))
            Line((0, 0), (2.828427125, 0))
        make_face()
    extrude(amount=2)
    with BuildSketch(Plane(origin=(31, 23, 2), x_dir=(0, 1, 0), z_dir=(0, 0, -1))) as raccordo2_piece_8:
        with BuildLine():
            CenterArc((3, -2.828427125), RACCORDO2_R, 109.471220634, 70.528779366)
            Line((0, -2.828427125), (0, 0))
            Line((0, 0), (2, 0))
        make_face()
    extrude(amount=2)
    with BuildSketch(Plane(origin=(23, -23, 10), x_dir=(0, -1, 0), z_dir=(0, 0, -1))) as raccordo2_piece_9:
        with BuildLine():
            CenterArc((3, 2.828427125), RACCORDO2_R, 180, 70.528779366)
            Line((0, 2.828427125), (0, 0))
            Line((0, 0), (2, 0))
        make_face()
    extrude(amount=2)
    # the kernel refuses this fillet: 3 mm, written as the material it takes off along each edge
    with BuildSketch(Plane(origin=(23.5, 25, 19), x_dir=(0, 0, -1), z_dir=(1, 0, 0)), Plane(origin=(40.5, 7.5, 43), x_dir=(0, -1, 0), z_dir=(-1, 0, 0)), Plane(origin=(23.5, -7.5, 43), x_dir=(0, 1, 0), z_dir=(1, 0, 0)), Plane(origin=(46.5, -7.5, 43), x_dir=(0, 0, -1), z_dir=(-1, 0, 0)), Plane(origin=(46.5, -25, 19), x_dir=(0, 0, -1), z_dir=(-1, 0, 0)), Plane(origin=(8, -31, 17.5), x_dir=(0, 1, 0), z_dir=(0, 0, -1)), Plane(origin=(0, -31, 17.5), x_dir=(1, 0, 0), z_dir=(0, 0, -1)), Plane(origin=(0, 31, 17.5), x_dir=(0, -1, 0), z_dir=(0, 0, -1)), Plane(origin=(8, 31, 17.5), x_dir=(-1, 0, 0), z_dir=(0, 0, -1))) as raccordo2_2_piece_1:
        with BuildLine():
            CenterArc((RACCORDO2_R, -RACCORDO2_R), RACCORDO2_R, 90, 90)
            Line((0, -RACCORDO2_R), (0, 0))
            Line((0, 0), (RACCORDO2_R, 0))
        make_face()
    extrude(amount=17, mode=Mode.SUBTRACT)
    with BuildSketch(Plane(origin=(46.5, 25, 19), x_dir=(0, 0, -1), z_dir=(-1, 0, 0)), Plane(origin=(29.5, 7.5, 43), x_dir=(0, -1, 0), z_dir=(1, 0, 0)), Plane(origin=(23.5, -25, 19), x_dir=(0, 0, -1), z_dir=(1, 0, 0)), Plane(origin=(8, -31, 9.5), x_dir=(-1, 0, 0), z_dir=(0, 0, -1)), Plane(origin=(0, -31, 9.5), x_dir=(0, 1, 0), z_dir=(0, 0, -1)), Plane(origin=(0, 31, 9.5), x_dir=(1, 0, 0), z_dir=(0, 0, -1)), Plane(origin=(8, 31, 9.5), x_dir=(0, -1, 0), z_dir=(0, 0, -1))) as raccordo2_2_piece_2:
        with BuildLine():
            CenterArc((RACCORDO2_R, RACCORDO2_R), RACCORDO2_R, 180, 90)
            Line((0, RACCORDO2_R), (0, 0))
            Line((0, 0), (RACCORDO2_R, 0))
        make_face()
    extrude(amount=17, mode=Mode.SUBTRACT)
    with BuildSketch(Plane(origin=(42, 20, 10), x_dir=(-1, 0, 0), z_dir=(0, 1, 0)), Plane(origin=(42, -30.5, 10), x_dir=(-1, 0, 0), z_dir=(0, 1, 0))) as raccordo2_2_piece_3:
        with BuildLine():
            CenterArc((RACCORDO2_R, -RACCORDO2_R), RACCORDO2_R, 90, 90)
            Line((0, -RACCORDO2_R), (0, 0))
            Line((0, 0), (RACCORDO2_R, 0))
        make_face()
    extrude(amount=10.5, mode=Mode.SUBTRACT)

    # Raccordo30
    raccordo30_edges = [part.edges().sort_by_distance(p)[0] for p in [
        (39, 23, 1.063508327),
        (39, -23, 1.063508327),
    ]]
    fillet(raccordo30_edges, radius=RACCORDO30_R - 0.0001)  # a hair under: the kernel refuses the full size


solid = part.part
